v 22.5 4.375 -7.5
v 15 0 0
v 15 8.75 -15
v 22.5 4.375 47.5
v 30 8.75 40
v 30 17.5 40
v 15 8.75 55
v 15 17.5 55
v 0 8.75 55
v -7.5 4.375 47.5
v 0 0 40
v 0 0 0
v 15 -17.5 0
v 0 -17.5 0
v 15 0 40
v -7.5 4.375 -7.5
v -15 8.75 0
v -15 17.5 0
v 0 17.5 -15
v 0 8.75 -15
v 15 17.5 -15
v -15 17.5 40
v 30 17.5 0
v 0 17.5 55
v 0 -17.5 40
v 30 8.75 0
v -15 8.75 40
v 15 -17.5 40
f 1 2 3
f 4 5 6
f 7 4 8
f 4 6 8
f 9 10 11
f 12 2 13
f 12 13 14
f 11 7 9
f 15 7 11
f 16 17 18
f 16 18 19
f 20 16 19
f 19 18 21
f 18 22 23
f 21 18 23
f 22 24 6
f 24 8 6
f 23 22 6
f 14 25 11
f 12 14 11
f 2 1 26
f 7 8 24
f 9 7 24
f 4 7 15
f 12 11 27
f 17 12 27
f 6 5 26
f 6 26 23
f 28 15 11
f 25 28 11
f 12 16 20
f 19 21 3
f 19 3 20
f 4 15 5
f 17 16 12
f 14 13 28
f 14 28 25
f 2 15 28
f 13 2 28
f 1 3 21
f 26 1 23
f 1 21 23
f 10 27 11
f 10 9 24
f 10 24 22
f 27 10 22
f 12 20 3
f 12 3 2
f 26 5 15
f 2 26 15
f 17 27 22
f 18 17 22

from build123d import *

# Parameters (mm, degrees)
F0_W          = 15
F0_H          = 8.75
F0_H_2        = 17.5
F1_DEPTH      = 40
F2_DEPTH      = 55
F3_DEPTH      = 15
F7_DEPTH      = 20.4590409994
F8_ANGLE      = 180
F10_DEPTH     = 25
F11_T4_DEPTH  = 56.0752448195
F11_T12_DEPTH = 56.0752448195
F11_T20_DEPTH = 56.0752448195
F11_T28_DEPTH = 56.0752448195


# Not quite as in the source:
# - a fillet or chamfer that OpenCascade refuses, or shapes differently, is made with other operations: its cross-section is extruded or revolved along the edge and cut away or added


with BuildPart() as f1:
    # F0 (on Top) → F1 (new body)
    with BuildSketch(Plane.XY):
        with Locations((0, 13.125)):
            Rectangle(F0_W, F0_H)
        with Locations((0, -8.75)):
            Rectangle(F0_W, F0_H_2)
        with Locations((0, 4.375)):
            Rectangle(F0_W, F0_H)
        with Locations((15, 13.125)):
            Rectangle(F0_W, F0_H)
        Polygon((22.5, 8.75), (7.5, 8.75), (7.5, 0), align=None)
        with Locations((-15, 13.125)):
            Rectangle(F0_W, F0_H)
        Polygon((-7.5, 0), (-7.5, 8.75), (-22.5, 8.75), align=None)
    extrude(amount=F1_DEPTH)



with BuildPart() as f2:
    # F0 (on Top) → F2 (new body)
    with BuildSketch(Plane.XY):
        with Locations((0, 4.375)):
            Rectangle(F0_W, F0_H)
        with Locations((0, 13.125)):
            Rectangle(F0_W, F0_H)
    extrude(amount=F2_DEPTH)


with BuildPart() as f1_1:
    add(f1.part)

    add(f2.part)  # F3 merges F2
    # F0 (on Top) → F3 (join)
    with BuildSketch(Plane.XY):
        with Locations((0, 4.375)):
            Rectangle(F0_W, F0_H)
        with Locations((0, 13.125)):
            Rectangle(F0_W, F0_H)
    extrude(amount=-F3_DEPTH)

    # F4: union 


with BuildPart() as f1_2:
    # F6: moved
    add(f1_1.part.moved(Location((7.5, 0, 0))))

    # F5 (on Right) → F7 (cut)
    with BuildSketch(Plane.YZ):
        Polygon((8.75, -15), (0, 0), (0, -15), align=None)
    extrude(amount=F7_DEPTH, mode=Mode.SUBTRACT)


with BuildPart() as f1_3:
    # F8: moved
    add(f1_2.part.rotate(Axis((7.5, 0, 0), (0, -1, 0)), F8_ANGLE))


with BuildPart() as f1_4:
    # F9: moved
    add(f1_3.part.moved(Location((0, 0, 40))))

    # F5 (on Right) → F10 (cut)
    with BuildSketch(Plane.YZ):
        Polygon((8.75, -15), (0, 0), (0, -15), align=None)
    extrude(amount=F10_DEPTH, mode=Mode.SUBTRACT)

    # F11: chamfer of 15 on 4 edges, made by hand


with BuildPart() as f11_tool2:
    # F11_s3 → F11_t4 (new body)
    with BuildSketch(Plane.XZ.offset(-17.5)):
        Polygon((30, 40), (15, 55), (15, 40), align=None)
    extrude(amount=F11_T4_DEPTH)

    split(bisect_by=Plane.YZ.offset(30), keep=Keep.BOTTOM)

    split(bisect_by=Plane(origin=(3.8082901554, -6.5284974093, 0), x_dir=(0, 0, 1), z_dir=(-0.5038710255, 0.8637789009, 0)), keep=Keep.TOP)

    split(bisect_by=Plane(origin=(0, -17.4093264249, 10.1554404145), x_dir=(1, 0, 0), z_dir=(0, 0.8637789009, -0.5038710255)), keep=Keep.TOP)

    split(bisect_by=Plane.XY.offset(55), keep=Keep.BOTTOM)


with BuildPart() as f1_5:
    add(f1_4.part)

    # F11_t1: union F11_tool2
    add(f11_tool2.part)


with BuildPart() as f11_tool10:
    # F11_s11 → F11_t12 (new body)
    with BuildSketch(Plane.XZ.offset(38.5752448195)):
        Polygon((-15, 0), (0, -15), (0, 0), align=None)
    extrude(amount=-F11_T12_DEPTH)

    split(bisect_by=Plane.YZ.offset(-15), keep=Keep.TOP)

    split(bisect_by=Plane(origin=(0, 0, 0), x_dir=(0, 0, 1), z_dir=(0.5038710255, 0.8637789009, 0)), keep=Keep.TOP)

    split(bisect_by=Plane.XY.offset(-15), keep=Keep.TOP)

    split(bisect_by=Plane(origin=(0, 0, 0), x_dir=(1, 0, 0), z_dir=(0, 0.8637789009, 0.5038710255)), keep=Keep.TOP)


with BuildPart() as f1_6:
    add(f1_5.part)

    # F11_t9: union F11_tool10
    add(f11_tool10.part)


with BuildPart() as f11_tool18:
    # F11_s19 → F11_t20 (new body)
    with BuildSketch(Plane.XZ.offset(-17.5)):
        Polygon((15, -15), (30, 0), (15, 0), align=None)
    extrude(amount=F11_T20_DEPTH)

    split(bisect_by=Plane.XY.offset(-15), keep=Keep.TOP)

    split(bisect_by=Plane(origin=(0, 0, 0), x_dir=(1, 0, 0), z_dir=(0, 0.8637789009, 0.5038710255)), keep=Keep.TOP)

    split(bisect_by=Plane(origin=(3.8082901554, -6.5284974093, 0), x_dir=(0, 0, 1), z_dir=(-0.5038710255, 0.8637789009, 0)), keep=Keep.TOP)

    split(bisect_by=Plane.YZ.offset(30), keep=Keep.BOTTOM)


with BuildPart() as f1_7:
    add(f1_6.part)

    # F11_t17: union F11_tool18
    add(f11_tool18.part)


with BuildPart() as f11_tool26:
    # F11_s27 → F11_t28 (new body)
    with BuildSketch(Plane.XZ.offset(38.5752448195)):
        Polygon((0, 55), (-15, 40), (0, 40), align=None)
    extrude(amount=-F11_T28_DEPTH)

    split(bisect_by=Plane.XY.offset(55), keep=Keep.BOTTOM)

    split(bisect_by=Plane(origin=(0, -17.4093264249, 10.1554404145), x_dir=(1, 0, 0), z_dir=(0, 0.8637789009, -0.5038710255)), keep=Keep.TOP)

    split(bisect_by=Plane.YZ.offset(-15), keep=Keep.TOP)

    split(bisect_by=Plane(origin=(0, 0, 0), x_dir=(0, 0, 1), z_dir=(0.5038710255, 0.8637789009, 0)), keep=Keep.TOP)


with BuildPart() as f1_8:
    add(f1_7.part)

    # F11_t25: union F11_tool26
    add(f11_tool26.part)


solid = f1_8.part
